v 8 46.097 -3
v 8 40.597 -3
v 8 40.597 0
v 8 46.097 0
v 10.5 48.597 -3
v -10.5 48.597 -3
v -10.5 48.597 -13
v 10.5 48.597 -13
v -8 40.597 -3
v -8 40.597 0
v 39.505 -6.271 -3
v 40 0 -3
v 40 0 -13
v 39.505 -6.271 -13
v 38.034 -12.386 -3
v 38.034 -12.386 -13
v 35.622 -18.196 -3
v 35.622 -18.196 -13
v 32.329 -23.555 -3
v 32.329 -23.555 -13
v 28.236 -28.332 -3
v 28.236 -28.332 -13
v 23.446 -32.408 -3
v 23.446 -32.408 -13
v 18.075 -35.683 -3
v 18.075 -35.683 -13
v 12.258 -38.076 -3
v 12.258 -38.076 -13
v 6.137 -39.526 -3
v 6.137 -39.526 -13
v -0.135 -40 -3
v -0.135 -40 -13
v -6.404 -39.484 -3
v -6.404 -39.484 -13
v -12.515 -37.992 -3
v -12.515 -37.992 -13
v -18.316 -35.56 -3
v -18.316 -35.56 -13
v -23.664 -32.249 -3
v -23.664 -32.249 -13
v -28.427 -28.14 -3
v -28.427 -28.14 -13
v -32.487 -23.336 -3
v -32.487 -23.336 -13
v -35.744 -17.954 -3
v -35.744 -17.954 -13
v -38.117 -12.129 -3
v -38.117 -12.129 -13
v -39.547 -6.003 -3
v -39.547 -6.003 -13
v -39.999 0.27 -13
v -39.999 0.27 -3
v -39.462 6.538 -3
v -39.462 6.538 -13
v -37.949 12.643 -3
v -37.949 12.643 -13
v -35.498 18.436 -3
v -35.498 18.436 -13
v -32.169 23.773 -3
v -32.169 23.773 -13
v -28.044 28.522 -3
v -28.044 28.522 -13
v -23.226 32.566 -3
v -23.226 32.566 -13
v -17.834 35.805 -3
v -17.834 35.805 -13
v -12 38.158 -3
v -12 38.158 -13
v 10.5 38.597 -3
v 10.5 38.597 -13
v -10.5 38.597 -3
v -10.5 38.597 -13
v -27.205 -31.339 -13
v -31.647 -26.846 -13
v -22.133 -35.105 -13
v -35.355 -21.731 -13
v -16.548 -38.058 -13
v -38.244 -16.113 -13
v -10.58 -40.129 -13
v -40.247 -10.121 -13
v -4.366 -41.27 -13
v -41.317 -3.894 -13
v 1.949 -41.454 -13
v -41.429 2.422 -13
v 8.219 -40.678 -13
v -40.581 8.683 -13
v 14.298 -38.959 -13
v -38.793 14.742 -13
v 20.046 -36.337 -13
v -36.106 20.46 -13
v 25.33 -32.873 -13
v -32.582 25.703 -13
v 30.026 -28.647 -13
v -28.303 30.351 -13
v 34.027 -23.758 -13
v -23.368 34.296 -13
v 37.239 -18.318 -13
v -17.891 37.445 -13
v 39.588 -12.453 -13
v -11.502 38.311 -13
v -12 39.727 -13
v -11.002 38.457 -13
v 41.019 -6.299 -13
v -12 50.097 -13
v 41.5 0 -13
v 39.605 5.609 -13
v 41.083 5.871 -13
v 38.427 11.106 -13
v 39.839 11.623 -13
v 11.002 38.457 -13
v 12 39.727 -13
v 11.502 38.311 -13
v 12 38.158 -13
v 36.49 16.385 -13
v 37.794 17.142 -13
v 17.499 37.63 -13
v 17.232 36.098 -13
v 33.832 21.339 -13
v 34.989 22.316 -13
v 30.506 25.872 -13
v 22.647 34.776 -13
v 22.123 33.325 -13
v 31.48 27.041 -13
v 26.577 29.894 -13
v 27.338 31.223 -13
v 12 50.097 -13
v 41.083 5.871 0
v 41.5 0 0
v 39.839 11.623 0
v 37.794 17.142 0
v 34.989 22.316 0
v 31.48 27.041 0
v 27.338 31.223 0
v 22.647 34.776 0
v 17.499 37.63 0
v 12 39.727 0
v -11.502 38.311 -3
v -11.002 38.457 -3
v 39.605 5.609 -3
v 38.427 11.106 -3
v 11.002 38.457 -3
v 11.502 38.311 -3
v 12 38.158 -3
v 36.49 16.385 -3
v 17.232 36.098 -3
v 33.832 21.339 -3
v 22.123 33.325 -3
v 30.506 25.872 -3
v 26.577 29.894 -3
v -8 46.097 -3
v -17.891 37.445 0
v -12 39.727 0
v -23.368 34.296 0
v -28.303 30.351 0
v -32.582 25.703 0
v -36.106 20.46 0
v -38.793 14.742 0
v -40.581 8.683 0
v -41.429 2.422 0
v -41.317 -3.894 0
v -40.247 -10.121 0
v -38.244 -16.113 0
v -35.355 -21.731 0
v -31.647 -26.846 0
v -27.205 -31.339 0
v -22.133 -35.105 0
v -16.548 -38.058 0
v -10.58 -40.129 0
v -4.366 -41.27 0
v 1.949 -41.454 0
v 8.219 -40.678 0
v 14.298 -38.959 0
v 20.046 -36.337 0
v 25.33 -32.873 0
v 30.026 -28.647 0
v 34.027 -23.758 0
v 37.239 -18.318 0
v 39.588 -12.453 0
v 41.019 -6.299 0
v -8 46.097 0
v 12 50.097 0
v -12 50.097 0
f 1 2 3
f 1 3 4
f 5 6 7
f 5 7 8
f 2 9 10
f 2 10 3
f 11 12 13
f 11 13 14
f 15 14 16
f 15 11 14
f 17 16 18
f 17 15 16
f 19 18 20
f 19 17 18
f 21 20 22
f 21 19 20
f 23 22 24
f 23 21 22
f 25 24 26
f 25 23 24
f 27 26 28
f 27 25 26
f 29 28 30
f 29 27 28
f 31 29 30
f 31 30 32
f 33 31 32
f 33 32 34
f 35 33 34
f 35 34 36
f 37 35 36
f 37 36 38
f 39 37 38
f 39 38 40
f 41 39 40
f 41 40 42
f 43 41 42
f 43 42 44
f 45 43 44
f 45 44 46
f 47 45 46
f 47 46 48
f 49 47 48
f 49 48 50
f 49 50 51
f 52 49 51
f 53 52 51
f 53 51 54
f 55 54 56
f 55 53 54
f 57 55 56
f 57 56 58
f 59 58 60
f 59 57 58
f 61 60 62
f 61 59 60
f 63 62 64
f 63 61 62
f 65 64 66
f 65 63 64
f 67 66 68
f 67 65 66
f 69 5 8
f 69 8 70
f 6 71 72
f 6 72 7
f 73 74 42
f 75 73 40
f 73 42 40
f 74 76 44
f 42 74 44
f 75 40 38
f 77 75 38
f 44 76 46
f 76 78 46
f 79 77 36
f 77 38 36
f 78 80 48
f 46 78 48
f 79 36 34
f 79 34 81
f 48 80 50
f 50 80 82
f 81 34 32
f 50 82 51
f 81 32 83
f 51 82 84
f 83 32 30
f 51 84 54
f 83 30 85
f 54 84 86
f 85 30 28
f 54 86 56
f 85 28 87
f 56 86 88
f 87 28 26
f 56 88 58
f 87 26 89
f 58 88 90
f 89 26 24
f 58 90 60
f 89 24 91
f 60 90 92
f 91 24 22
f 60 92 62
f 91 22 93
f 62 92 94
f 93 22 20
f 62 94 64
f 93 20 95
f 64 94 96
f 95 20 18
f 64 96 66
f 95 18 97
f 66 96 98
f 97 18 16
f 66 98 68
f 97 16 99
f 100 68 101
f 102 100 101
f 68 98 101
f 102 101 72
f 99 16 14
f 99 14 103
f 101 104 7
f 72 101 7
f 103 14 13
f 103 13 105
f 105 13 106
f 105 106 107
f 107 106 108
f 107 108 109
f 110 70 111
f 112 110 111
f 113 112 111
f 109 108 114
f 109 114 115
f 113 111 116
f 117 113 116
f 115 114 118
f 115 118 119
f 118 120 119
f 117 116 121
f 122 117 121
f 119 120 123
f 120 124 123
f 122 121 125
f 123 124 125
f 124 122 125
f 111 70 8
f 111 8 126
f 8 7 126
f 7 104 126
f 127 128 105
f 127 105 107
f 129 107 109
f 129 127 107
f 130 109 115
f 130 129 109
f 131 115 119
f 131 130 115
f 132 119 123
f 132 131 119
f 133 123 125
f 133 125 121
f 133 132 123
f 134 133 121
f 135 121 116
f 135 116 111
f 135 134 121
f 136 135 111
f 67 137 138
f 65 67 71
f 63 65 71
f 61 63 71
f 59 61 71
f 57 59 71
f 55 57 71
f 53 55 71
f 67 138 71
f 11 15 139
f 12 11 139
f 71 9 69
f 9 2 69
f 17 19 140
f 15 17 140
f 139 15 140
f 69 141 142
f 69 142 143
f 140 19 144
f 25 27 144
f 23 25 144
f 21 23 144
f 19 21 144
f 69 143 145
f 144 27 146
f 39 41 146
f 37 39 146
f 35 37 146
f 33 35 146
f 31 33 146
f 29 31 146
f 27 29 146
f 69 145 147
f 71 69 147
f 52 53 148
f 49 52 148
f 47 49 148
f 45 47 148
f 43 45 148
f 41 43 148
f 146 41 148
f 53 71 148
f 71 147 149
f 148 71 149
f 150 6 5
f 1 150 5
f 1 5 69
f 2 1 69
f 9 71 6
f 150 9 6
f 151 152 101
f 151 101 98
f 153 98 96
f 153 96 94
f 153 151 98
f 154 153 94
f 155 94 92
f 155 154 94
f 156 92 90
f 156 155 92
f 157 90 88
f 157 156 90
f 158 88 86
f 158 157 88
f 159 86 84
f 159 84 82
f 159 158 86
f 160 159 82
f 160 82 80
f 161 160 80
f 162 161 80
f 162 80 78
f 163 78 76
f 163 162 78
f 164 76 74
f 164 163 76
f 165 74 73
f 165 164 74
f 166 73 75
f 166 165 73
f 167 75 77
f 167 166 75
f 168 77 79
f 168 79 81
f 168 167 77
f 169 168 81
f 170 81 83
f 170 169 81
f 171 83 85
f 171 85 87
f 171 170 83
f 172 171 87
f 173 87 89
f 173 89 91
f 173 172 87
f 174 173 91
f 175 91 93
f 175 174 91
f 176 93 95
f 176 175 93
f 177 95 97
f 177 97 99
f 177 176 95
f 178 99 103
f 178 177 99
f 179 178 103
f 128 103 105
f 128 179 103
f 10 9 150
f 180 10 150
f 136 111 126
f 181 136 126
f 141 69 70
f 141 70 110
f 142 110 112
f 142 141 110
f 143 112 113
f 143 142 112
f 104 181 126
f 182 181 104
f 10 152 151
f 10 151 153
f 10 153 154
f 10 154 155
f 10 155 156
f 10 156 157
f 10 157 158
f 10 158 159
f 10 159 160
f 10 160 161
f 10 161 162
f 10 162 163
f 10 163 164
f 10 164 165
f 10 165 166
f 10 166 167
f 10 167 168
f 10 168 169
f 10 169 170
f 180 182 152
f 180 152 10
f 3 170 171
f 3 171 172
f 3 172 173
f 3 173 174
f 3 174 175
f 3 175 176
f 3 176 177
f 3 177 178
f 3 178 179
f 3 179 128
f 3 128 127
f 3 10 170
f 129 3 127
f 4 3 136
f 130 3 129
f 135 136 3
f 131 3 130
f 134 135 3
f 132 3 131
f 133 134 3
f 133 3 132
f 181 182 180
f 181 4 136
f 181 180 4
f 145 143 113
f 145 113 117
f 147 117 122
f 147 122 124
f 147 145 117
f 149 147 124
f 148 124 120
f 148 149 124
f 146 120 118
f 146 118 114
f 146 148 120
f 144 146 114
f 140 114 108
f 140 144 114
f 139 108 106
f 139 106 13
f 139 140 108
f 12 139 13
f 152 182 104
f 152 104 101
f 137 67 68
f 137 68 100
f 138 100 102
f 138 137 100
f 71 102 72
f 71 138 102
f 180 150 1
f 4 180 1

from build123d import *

# Parameters (mm, degrees)
BOSS_EXTRUDE1_DEPTH = 13
BOSS_EXTRUDE2_DEPTH = 3
CUT_EXTRUDE1_START  = -3
SKETCH2_W           = 16
SKETCH2_H           = 5.5
CUT_EXTRUDE1_DEPTH  = 3


with BuildPart() as part:
    # Sketch1 → Boss-Extrude1 (new body)
    with BuildSketch(Plane.XY):
        with BuildLine():
            Line((-10.5, 40.1497198), (-10.5, 48.597279697))
            Line((-10.5, 48.597279697), (10.5, 48.597279697))
            Line((10.5, 48.597279697), (10.5, 40.1497198))
            ThreePointArc((10.5, 40.1497198), (11.251983463, 39.945498722), (12, 39.727194716))
            Line((12, 39.727194716), (12, 50.097279697))
            Line((12, 50.097279697), (-12, 50.097279697))
            Line((-12, 50.097279697), (-12, 39.727194716))
            ThreePointArc((-12, 39.727194716), (-11.251983463, 39.945498722), (-10.5, 40.1497198))
        make_face()
        with BuildLine():
            ThreePointArc((12, 39.727194716), (11.251983463, 39.945498722), (10.5, 40.1497198))
            Line((10.5, 40.1497198), (10.5, 38.597279697))
            ThreePointArc((10.5, 38.597279697), (11.252148087, 38.384751705), (12, 38.157568057))
            Line((12, 38.157568057), (12, 39.727194716))
        make_face()
        with BuildLine():
            Line((-12, 38.157568057), (-12, 39.727194716))
            ThreePointArc((-12, 39.727194716), (-24.741160037, -33.318538383), (41.5, 0))
            ThreePointArc((41.5, 0), (33.318538383, 24.741160037), (12, 39.727194716))
            Line((12, 39.727194716), (12, 38.157568057))
            ThreePointArc((12, 38.157568057), (32.249030993, 23.664319132), (40, 0))
            ThreePointArc((40, 0), (-23.664319132, -32.249030993), (-12, 38.157568057))
        make_face()
        with BuildLine():
            Line((-10.5, 38.597279697), (-10.5, 40.1497198))
            ThreePointArc((-10.5, 40.1497198), (-11.251983463, 39.945498722), (-12, 39.727194716))
            Line((-12, 39.727194716), (-12, 38.157568057))
            ThreePointArc((-12, 38.157568057), (-11.252148087, 38.384751705), (-10.5, 38.597279697))
        make_face()
    extrude(amount=-BOSS_EXTRUDE1_DEPTH)

    # Sketch1_3 → Boss-Extrude2 (add)
    with BuildSketch(Plane.XY):
        with BuildLine():
            Line((-12, 37.097279697), (-12, 38.157568057))
            ThreePointArc((-12, 38.157568057), (-23.664319132, -32.249030993), (40, 0))
            ThreePointArc((40, 0), (32.249030993, 23.664319132), (12, 38.157568057))
            Line((12, 38.157568057), (12, 37.097279697))
            Line((12, 37.097279697), (-12, 37.097279697))
        make_face()
        with BuildLine():
            Line((10.5, 38.597279697), (-10.5, 38.597279697))
            ThreePointArc((-10.5, 38.597279697), (-11.252148087, 38.384751705), (-12, 38.157568057))
            Line((-12, 38.157568057), (-12, 37.097279697))
            Line((-12, 37.097279697), (12, 37.097279697))
            Line((12, 37.097279697), (12, 38.157568057))
            ThreePointArc((12, 38.157568057), (11.252148087, 38.384751705), (10.5, 38.597279697))
        make_face()
        with BuildLine():
            ThreePointArc((10.5, 38.597279697), (0, 40), (-10.5, 38.597279697))
            Line((-10.5, 38.597279697), (10.5, 38.597279697))
        make_face()
        with BuildLine():
            ThreePointArc((10.5, 40.1497198), (0, 41.5), (-10.5, 40.1497198))
            Line((-10.5, 40.1497198), (-10.5, 38.597279697))
            ThreePointArc((-10.5, 38.597279697), (0, 40), (10.5, 38.597279697))
            Line((10.5, 38.597279697), (10.5, 40.1497198))
        make_face()
        with BuildLine():
            Line((10.5, 48.597279697), (-10.5, 48.597279697))
            Line((-10.5, 48.597279697), (-10.5, 40.1497198))
            ThreePointArc((-10.5, 40.1497198), (0, 41.5), (10.5, 40.1497198))
            Line((10.5, 40.1497198), (10.5, 48.597279697))
        make_face()
    extrude(amount=-BOSS_EXTRUDE2_DEPTH)

    # Sketch2 → Cut-Extrude1 (cut)
    with BuildSketch(Plane.XY.offset(CUT_EXTRUDE1_START)):
        with Locations((0, 43.347279697)):
            Rectangle(SKETCH2_W, SKETCH2_H)
    extrude(amount=CUT_EXTRUDE1_DEPTH, mode=Mode.SUBTRACT)


solid = part.part
